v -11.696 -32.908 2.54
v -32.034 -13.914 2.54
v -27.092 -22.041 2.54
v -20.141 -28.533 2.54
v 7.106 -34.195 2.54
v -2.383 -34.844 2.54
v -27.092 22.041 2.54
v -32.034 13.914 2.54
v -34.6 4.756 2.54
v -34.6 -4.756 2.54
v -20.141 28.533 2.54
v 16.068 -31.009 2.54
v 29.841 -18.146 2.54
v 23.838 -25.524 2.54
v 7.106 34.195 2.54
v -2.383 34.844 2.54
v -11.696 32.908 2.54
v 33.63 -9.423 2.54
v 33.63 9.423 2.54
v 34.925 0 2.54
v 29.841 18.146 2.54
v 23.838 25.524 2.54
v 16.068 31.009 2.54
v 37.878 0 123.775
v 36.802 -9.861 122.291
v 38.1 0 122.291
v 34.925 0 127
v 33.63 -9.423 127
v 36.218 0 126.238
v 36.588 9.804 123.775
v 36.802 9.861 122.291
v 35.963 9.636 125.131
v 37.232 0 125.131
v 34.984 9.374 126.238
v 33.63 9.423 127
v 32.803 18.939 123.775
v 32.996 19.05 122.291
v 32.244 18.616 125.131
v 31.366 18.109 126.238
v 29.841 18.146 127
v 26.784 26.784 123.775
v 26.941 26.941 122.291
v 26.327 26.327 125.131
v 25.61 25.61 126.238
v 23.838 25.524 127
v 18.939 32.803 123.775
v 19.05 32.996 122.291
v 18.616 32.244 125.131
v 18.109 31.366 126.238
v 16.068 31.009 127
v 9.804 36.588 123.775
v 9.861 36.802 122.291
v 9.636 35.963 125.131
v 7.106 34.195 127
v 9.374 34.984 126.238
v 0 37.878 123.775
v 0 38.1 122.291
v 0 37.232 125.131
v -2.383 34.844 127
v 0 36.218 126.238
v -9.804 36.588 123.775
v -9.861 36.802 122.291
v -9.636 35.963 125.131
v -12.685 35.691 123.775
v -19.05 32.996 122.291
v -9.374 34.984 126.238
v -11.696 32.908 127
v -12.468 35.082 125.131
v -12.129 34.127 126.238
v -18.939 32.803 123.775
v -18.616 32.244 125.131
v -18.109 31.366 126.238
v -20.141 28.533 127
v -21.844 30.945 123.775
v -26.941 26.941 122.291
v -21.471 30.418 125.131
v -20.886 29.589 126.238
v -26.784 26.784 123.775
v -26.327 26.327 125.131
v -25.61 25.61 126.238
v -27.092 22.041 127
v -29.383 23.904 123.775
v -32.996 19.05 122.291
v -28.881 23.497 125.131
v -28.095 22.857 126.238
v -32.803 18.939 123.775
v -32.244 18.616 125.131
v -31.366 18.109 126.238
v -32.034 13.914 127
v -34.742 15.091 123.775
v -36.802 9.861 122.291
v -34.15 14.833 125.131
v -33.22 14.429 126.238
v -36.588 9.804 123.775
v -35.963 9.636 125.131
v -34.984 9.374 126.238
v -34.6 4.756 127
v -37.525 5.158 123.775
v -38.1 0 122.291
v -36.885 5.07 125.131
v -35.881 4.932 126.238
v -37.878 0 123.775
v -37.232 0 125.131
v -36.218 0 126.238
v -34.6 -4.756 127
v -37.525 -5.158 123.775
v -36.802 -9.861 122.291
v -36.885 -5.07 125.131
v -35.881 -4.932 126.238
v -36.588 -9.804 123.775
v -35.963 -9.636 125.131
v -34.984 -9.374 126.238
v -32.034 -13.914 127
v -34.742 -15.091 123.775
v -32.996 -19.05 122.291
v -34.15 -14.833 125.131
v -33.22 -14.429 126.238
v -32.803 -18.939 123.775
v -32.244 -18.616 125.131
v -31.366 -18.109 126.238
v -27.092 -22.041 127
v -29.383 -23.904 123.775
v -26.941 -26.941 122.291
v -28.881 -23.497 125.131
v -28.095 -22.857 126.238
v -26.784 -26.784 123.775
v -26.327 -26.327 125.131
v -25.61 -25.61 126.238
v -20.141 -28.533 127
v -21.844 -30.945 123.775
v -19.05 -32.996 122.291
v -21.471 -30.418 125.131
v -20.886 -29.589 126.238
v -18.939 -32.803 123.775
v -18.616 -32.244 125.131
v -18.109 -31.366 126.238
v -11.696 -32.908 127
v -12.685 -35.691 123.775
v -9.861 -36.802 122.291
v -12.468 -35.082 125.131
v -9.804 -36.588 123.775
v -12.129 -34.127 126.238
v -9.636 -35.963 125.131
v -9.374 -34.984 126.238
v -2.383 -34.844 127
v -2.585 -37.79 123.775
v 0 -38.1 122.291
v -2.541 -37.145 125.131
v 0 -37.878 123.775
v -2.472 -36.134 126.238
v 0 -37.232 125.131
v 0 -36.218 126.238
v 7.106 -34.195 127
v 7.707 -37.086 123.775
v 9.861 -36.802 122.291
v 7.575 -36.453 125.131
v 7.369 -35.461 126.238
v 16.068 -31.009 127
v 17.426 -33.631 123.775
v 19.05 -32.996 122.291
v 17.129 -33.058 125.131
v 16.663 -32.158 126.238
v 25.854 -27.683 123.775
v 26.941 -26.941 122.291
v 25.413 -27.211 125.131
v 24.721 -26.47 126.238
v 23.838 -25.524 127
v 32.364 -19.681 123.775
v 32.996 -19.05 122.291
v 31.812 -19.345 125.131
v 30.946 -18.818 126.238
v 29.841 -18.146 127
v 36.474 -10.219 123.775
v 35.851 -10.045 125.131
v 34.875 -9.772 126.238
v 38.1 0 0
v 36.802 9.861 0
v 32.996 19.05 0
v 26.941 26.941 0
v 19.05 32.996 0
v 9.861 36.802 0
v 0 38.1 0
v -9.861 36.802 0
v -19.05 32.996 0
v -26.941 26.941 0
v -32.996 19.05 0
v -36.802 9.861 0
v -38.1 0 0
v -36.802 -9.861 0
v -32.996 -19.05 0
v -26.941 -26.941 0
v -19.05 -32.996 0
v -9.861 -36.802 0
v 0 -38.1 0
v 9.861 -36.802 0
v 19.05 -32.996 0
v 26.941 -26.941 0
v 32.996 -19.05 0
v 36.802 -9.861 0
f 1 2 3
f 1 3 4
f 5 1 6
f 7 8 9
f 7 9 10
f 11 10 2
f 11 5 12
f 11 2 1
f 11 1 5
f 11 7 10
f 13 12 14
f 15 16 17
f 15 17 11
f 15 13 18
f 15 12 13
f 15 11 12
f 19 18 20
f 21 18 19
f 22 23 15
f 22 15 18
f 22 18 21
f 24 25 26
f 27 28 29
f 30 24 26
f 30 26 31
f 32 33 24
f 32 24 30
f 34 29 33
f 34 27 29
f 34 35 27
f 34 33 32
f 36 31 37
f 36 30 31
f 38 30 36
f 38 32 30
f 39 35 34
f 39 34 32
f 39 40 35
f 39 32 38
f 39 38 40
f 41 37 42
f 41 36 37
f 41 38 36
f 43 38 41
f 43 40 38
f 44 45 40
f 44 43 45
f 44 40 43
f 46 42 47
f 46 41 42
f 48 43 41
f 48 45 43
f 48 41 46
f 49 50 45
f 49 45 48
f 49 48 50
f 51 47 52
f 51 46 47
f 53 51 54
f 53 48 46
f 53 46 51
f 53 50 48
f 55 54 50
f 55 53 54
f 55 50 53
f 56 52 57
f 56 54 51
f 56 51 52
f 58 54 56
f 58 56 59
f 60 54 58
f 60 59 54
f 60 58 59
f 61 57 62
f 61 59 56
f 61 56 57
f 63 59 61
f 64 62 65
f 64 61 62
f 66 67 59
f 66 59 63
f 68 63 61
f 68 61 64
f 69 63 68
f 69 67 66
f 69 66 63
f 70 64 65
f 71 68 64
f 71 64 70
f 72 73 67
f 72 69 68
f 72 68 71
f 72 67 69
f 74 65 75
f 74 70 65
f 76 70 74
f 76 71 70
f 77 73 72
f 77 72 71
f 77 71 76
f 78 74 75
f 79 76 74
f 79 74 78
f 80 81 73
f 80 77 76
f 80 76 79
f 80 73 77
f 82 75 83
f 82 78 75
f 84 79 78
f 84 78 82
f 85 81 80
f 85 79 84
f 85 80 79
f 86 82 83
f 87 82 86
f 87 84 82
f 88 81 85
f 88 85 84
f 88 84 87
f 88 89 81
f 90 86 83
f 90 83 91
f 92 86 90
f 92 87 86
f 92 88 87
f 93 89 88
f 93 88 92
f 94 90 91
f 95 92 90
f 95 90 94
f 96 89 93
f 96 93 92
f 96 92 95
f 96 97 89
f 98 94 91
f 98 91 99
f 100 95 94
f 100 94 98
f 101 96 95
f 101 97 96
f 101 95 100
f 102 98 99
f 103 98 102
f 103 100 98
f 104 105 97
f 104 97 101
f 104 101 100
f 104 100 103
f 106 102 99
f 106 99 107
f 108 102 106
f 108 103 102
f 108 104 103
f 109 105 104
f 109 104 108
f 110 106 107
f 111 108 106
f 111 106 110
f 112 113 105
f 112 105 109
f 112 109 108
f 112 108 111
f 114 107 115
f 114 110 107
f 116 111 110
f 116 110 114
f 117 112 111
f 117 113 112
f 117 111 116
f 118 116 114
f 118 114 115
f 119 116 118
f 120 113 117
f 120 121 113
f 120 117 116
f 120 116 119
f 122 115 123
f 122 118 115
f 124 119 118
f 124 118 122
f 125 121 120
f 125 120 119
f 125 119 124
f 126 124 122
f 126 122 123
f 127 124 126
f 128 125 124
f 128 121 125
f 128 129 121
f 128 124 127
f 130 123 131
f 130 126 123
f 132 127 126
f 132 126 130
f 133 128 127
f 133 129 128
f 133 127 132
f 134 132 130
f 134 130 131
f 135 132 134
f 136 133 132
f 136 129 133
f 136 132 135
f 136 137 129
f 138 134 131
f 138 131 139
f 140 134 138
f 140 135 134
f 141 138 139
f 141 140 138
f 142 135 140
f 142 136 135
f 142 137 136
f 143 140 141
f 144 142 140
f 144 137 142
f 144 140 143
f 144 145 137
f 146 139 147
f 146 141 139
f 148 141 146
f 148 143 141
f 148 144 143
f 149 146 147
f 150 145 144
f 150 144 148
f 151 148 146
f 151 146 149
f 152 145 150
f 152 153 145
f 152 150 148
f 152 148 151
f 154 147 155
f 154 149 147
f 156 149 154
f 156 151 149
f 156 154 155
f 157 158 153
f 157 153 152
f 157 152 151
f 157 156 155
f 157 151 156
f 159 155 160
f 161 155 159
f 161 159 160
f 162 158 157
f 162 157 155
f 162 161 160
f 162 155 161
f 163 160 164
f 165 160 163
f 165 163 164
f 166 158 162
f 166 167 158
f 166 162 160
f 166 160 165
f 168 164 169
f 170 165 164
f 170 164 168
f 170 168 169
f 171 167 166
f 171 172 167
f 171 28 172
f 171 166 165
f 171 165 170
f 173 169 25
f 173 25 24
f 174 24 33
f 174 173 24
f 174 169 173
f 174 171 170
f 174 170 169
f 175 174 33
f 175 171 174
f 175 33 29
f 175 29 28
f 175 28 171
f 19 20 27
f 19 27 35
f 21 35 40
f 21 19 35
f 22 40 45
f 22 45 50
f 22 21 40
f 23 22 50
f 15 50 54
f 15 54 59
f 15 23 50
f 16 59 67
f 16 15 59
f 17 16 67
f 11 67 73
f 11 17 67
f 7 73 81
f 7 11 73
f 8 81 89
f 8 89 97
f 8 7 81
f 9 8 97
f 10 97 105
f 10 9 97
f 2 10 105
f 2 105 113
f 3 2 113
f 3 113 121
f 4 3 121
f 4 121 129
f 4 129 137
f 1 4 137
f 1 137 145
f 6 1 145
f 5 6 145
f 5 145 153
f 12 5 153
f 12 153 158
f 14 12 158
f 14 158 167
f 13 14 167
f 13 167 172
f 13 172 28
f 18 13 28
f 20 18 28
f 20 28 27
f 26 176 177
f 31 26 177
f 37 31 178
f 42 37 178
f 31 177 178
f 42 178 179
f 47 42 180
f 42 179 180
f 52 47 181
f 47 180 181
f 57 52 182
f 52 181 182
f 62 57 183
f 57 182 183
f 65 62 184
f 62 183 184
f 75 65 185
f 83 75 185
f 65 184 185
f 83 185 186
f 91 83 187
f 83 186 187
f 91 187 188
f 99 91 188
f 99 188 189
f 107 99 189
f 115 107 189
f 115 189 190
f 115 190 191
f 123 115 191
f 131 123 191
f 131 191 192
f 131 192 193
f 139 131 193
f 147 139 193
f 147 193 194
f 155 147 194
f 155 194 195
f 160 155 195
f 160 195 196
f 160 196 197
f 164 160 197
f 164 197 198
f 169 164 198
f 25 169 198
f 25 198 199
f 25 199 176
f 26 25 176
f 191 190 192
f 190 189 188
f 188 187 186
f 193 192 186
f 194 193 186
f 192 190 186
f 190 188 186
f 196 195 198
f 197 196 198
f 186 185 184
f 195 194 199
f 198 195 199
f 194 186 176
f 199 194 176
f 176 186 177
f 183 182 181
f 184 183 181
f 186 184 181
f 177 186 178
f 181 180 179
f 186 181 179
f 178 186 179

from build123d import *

# Parameters (mm, degrees)
F0_R     = 38.1
F0_R_2   = 34.925
F1_DEPTH = 127
F2_R     = 34.925
F3_DEPTH = 2.54


# Not quite as in the source:
# - a fillet or chamfer that OpenCascade refuses, or shapes differently, is made with other operations: its cross-section is extruded or revolved along the edge and cut away or added


with BuildPart() as f1:
    # F0 (on Top) → F1 (new body)
    with BuildSketch(Plane.XY):
        Circle(F0_R)
        Circle(F0_R_2, mode=Mode.SUBTRACT)
    extrude(amount=F1_DEPTH)

    # F2 (on Top) → F3 (join)
    with BuildSketch(Plane.XY):
        Circle(F2_R)
    extrude(amount=F3_DEPTH)

    # F4: fillet of radius 5.08 on 1 edges, made by hand

    # F4_s1 → F4_t2 (revolve, cut)
    with BuildSketch(Plane.XZ):
        with BuildLine():
            ThreePointArc((38.1, 122.2907139607), (37.2321134838, 125.1305202921), (34.925, 127))
            Line((34.925, 127), (38.1, 127))
            Line((38.1, 127), (38.1, 122.2907139607))
        make_face()
    revolve(axis=Axis((0, 0, 127), (0, 0, 1)), mode=Mode.SUBTRACT)


solid = f1.part
